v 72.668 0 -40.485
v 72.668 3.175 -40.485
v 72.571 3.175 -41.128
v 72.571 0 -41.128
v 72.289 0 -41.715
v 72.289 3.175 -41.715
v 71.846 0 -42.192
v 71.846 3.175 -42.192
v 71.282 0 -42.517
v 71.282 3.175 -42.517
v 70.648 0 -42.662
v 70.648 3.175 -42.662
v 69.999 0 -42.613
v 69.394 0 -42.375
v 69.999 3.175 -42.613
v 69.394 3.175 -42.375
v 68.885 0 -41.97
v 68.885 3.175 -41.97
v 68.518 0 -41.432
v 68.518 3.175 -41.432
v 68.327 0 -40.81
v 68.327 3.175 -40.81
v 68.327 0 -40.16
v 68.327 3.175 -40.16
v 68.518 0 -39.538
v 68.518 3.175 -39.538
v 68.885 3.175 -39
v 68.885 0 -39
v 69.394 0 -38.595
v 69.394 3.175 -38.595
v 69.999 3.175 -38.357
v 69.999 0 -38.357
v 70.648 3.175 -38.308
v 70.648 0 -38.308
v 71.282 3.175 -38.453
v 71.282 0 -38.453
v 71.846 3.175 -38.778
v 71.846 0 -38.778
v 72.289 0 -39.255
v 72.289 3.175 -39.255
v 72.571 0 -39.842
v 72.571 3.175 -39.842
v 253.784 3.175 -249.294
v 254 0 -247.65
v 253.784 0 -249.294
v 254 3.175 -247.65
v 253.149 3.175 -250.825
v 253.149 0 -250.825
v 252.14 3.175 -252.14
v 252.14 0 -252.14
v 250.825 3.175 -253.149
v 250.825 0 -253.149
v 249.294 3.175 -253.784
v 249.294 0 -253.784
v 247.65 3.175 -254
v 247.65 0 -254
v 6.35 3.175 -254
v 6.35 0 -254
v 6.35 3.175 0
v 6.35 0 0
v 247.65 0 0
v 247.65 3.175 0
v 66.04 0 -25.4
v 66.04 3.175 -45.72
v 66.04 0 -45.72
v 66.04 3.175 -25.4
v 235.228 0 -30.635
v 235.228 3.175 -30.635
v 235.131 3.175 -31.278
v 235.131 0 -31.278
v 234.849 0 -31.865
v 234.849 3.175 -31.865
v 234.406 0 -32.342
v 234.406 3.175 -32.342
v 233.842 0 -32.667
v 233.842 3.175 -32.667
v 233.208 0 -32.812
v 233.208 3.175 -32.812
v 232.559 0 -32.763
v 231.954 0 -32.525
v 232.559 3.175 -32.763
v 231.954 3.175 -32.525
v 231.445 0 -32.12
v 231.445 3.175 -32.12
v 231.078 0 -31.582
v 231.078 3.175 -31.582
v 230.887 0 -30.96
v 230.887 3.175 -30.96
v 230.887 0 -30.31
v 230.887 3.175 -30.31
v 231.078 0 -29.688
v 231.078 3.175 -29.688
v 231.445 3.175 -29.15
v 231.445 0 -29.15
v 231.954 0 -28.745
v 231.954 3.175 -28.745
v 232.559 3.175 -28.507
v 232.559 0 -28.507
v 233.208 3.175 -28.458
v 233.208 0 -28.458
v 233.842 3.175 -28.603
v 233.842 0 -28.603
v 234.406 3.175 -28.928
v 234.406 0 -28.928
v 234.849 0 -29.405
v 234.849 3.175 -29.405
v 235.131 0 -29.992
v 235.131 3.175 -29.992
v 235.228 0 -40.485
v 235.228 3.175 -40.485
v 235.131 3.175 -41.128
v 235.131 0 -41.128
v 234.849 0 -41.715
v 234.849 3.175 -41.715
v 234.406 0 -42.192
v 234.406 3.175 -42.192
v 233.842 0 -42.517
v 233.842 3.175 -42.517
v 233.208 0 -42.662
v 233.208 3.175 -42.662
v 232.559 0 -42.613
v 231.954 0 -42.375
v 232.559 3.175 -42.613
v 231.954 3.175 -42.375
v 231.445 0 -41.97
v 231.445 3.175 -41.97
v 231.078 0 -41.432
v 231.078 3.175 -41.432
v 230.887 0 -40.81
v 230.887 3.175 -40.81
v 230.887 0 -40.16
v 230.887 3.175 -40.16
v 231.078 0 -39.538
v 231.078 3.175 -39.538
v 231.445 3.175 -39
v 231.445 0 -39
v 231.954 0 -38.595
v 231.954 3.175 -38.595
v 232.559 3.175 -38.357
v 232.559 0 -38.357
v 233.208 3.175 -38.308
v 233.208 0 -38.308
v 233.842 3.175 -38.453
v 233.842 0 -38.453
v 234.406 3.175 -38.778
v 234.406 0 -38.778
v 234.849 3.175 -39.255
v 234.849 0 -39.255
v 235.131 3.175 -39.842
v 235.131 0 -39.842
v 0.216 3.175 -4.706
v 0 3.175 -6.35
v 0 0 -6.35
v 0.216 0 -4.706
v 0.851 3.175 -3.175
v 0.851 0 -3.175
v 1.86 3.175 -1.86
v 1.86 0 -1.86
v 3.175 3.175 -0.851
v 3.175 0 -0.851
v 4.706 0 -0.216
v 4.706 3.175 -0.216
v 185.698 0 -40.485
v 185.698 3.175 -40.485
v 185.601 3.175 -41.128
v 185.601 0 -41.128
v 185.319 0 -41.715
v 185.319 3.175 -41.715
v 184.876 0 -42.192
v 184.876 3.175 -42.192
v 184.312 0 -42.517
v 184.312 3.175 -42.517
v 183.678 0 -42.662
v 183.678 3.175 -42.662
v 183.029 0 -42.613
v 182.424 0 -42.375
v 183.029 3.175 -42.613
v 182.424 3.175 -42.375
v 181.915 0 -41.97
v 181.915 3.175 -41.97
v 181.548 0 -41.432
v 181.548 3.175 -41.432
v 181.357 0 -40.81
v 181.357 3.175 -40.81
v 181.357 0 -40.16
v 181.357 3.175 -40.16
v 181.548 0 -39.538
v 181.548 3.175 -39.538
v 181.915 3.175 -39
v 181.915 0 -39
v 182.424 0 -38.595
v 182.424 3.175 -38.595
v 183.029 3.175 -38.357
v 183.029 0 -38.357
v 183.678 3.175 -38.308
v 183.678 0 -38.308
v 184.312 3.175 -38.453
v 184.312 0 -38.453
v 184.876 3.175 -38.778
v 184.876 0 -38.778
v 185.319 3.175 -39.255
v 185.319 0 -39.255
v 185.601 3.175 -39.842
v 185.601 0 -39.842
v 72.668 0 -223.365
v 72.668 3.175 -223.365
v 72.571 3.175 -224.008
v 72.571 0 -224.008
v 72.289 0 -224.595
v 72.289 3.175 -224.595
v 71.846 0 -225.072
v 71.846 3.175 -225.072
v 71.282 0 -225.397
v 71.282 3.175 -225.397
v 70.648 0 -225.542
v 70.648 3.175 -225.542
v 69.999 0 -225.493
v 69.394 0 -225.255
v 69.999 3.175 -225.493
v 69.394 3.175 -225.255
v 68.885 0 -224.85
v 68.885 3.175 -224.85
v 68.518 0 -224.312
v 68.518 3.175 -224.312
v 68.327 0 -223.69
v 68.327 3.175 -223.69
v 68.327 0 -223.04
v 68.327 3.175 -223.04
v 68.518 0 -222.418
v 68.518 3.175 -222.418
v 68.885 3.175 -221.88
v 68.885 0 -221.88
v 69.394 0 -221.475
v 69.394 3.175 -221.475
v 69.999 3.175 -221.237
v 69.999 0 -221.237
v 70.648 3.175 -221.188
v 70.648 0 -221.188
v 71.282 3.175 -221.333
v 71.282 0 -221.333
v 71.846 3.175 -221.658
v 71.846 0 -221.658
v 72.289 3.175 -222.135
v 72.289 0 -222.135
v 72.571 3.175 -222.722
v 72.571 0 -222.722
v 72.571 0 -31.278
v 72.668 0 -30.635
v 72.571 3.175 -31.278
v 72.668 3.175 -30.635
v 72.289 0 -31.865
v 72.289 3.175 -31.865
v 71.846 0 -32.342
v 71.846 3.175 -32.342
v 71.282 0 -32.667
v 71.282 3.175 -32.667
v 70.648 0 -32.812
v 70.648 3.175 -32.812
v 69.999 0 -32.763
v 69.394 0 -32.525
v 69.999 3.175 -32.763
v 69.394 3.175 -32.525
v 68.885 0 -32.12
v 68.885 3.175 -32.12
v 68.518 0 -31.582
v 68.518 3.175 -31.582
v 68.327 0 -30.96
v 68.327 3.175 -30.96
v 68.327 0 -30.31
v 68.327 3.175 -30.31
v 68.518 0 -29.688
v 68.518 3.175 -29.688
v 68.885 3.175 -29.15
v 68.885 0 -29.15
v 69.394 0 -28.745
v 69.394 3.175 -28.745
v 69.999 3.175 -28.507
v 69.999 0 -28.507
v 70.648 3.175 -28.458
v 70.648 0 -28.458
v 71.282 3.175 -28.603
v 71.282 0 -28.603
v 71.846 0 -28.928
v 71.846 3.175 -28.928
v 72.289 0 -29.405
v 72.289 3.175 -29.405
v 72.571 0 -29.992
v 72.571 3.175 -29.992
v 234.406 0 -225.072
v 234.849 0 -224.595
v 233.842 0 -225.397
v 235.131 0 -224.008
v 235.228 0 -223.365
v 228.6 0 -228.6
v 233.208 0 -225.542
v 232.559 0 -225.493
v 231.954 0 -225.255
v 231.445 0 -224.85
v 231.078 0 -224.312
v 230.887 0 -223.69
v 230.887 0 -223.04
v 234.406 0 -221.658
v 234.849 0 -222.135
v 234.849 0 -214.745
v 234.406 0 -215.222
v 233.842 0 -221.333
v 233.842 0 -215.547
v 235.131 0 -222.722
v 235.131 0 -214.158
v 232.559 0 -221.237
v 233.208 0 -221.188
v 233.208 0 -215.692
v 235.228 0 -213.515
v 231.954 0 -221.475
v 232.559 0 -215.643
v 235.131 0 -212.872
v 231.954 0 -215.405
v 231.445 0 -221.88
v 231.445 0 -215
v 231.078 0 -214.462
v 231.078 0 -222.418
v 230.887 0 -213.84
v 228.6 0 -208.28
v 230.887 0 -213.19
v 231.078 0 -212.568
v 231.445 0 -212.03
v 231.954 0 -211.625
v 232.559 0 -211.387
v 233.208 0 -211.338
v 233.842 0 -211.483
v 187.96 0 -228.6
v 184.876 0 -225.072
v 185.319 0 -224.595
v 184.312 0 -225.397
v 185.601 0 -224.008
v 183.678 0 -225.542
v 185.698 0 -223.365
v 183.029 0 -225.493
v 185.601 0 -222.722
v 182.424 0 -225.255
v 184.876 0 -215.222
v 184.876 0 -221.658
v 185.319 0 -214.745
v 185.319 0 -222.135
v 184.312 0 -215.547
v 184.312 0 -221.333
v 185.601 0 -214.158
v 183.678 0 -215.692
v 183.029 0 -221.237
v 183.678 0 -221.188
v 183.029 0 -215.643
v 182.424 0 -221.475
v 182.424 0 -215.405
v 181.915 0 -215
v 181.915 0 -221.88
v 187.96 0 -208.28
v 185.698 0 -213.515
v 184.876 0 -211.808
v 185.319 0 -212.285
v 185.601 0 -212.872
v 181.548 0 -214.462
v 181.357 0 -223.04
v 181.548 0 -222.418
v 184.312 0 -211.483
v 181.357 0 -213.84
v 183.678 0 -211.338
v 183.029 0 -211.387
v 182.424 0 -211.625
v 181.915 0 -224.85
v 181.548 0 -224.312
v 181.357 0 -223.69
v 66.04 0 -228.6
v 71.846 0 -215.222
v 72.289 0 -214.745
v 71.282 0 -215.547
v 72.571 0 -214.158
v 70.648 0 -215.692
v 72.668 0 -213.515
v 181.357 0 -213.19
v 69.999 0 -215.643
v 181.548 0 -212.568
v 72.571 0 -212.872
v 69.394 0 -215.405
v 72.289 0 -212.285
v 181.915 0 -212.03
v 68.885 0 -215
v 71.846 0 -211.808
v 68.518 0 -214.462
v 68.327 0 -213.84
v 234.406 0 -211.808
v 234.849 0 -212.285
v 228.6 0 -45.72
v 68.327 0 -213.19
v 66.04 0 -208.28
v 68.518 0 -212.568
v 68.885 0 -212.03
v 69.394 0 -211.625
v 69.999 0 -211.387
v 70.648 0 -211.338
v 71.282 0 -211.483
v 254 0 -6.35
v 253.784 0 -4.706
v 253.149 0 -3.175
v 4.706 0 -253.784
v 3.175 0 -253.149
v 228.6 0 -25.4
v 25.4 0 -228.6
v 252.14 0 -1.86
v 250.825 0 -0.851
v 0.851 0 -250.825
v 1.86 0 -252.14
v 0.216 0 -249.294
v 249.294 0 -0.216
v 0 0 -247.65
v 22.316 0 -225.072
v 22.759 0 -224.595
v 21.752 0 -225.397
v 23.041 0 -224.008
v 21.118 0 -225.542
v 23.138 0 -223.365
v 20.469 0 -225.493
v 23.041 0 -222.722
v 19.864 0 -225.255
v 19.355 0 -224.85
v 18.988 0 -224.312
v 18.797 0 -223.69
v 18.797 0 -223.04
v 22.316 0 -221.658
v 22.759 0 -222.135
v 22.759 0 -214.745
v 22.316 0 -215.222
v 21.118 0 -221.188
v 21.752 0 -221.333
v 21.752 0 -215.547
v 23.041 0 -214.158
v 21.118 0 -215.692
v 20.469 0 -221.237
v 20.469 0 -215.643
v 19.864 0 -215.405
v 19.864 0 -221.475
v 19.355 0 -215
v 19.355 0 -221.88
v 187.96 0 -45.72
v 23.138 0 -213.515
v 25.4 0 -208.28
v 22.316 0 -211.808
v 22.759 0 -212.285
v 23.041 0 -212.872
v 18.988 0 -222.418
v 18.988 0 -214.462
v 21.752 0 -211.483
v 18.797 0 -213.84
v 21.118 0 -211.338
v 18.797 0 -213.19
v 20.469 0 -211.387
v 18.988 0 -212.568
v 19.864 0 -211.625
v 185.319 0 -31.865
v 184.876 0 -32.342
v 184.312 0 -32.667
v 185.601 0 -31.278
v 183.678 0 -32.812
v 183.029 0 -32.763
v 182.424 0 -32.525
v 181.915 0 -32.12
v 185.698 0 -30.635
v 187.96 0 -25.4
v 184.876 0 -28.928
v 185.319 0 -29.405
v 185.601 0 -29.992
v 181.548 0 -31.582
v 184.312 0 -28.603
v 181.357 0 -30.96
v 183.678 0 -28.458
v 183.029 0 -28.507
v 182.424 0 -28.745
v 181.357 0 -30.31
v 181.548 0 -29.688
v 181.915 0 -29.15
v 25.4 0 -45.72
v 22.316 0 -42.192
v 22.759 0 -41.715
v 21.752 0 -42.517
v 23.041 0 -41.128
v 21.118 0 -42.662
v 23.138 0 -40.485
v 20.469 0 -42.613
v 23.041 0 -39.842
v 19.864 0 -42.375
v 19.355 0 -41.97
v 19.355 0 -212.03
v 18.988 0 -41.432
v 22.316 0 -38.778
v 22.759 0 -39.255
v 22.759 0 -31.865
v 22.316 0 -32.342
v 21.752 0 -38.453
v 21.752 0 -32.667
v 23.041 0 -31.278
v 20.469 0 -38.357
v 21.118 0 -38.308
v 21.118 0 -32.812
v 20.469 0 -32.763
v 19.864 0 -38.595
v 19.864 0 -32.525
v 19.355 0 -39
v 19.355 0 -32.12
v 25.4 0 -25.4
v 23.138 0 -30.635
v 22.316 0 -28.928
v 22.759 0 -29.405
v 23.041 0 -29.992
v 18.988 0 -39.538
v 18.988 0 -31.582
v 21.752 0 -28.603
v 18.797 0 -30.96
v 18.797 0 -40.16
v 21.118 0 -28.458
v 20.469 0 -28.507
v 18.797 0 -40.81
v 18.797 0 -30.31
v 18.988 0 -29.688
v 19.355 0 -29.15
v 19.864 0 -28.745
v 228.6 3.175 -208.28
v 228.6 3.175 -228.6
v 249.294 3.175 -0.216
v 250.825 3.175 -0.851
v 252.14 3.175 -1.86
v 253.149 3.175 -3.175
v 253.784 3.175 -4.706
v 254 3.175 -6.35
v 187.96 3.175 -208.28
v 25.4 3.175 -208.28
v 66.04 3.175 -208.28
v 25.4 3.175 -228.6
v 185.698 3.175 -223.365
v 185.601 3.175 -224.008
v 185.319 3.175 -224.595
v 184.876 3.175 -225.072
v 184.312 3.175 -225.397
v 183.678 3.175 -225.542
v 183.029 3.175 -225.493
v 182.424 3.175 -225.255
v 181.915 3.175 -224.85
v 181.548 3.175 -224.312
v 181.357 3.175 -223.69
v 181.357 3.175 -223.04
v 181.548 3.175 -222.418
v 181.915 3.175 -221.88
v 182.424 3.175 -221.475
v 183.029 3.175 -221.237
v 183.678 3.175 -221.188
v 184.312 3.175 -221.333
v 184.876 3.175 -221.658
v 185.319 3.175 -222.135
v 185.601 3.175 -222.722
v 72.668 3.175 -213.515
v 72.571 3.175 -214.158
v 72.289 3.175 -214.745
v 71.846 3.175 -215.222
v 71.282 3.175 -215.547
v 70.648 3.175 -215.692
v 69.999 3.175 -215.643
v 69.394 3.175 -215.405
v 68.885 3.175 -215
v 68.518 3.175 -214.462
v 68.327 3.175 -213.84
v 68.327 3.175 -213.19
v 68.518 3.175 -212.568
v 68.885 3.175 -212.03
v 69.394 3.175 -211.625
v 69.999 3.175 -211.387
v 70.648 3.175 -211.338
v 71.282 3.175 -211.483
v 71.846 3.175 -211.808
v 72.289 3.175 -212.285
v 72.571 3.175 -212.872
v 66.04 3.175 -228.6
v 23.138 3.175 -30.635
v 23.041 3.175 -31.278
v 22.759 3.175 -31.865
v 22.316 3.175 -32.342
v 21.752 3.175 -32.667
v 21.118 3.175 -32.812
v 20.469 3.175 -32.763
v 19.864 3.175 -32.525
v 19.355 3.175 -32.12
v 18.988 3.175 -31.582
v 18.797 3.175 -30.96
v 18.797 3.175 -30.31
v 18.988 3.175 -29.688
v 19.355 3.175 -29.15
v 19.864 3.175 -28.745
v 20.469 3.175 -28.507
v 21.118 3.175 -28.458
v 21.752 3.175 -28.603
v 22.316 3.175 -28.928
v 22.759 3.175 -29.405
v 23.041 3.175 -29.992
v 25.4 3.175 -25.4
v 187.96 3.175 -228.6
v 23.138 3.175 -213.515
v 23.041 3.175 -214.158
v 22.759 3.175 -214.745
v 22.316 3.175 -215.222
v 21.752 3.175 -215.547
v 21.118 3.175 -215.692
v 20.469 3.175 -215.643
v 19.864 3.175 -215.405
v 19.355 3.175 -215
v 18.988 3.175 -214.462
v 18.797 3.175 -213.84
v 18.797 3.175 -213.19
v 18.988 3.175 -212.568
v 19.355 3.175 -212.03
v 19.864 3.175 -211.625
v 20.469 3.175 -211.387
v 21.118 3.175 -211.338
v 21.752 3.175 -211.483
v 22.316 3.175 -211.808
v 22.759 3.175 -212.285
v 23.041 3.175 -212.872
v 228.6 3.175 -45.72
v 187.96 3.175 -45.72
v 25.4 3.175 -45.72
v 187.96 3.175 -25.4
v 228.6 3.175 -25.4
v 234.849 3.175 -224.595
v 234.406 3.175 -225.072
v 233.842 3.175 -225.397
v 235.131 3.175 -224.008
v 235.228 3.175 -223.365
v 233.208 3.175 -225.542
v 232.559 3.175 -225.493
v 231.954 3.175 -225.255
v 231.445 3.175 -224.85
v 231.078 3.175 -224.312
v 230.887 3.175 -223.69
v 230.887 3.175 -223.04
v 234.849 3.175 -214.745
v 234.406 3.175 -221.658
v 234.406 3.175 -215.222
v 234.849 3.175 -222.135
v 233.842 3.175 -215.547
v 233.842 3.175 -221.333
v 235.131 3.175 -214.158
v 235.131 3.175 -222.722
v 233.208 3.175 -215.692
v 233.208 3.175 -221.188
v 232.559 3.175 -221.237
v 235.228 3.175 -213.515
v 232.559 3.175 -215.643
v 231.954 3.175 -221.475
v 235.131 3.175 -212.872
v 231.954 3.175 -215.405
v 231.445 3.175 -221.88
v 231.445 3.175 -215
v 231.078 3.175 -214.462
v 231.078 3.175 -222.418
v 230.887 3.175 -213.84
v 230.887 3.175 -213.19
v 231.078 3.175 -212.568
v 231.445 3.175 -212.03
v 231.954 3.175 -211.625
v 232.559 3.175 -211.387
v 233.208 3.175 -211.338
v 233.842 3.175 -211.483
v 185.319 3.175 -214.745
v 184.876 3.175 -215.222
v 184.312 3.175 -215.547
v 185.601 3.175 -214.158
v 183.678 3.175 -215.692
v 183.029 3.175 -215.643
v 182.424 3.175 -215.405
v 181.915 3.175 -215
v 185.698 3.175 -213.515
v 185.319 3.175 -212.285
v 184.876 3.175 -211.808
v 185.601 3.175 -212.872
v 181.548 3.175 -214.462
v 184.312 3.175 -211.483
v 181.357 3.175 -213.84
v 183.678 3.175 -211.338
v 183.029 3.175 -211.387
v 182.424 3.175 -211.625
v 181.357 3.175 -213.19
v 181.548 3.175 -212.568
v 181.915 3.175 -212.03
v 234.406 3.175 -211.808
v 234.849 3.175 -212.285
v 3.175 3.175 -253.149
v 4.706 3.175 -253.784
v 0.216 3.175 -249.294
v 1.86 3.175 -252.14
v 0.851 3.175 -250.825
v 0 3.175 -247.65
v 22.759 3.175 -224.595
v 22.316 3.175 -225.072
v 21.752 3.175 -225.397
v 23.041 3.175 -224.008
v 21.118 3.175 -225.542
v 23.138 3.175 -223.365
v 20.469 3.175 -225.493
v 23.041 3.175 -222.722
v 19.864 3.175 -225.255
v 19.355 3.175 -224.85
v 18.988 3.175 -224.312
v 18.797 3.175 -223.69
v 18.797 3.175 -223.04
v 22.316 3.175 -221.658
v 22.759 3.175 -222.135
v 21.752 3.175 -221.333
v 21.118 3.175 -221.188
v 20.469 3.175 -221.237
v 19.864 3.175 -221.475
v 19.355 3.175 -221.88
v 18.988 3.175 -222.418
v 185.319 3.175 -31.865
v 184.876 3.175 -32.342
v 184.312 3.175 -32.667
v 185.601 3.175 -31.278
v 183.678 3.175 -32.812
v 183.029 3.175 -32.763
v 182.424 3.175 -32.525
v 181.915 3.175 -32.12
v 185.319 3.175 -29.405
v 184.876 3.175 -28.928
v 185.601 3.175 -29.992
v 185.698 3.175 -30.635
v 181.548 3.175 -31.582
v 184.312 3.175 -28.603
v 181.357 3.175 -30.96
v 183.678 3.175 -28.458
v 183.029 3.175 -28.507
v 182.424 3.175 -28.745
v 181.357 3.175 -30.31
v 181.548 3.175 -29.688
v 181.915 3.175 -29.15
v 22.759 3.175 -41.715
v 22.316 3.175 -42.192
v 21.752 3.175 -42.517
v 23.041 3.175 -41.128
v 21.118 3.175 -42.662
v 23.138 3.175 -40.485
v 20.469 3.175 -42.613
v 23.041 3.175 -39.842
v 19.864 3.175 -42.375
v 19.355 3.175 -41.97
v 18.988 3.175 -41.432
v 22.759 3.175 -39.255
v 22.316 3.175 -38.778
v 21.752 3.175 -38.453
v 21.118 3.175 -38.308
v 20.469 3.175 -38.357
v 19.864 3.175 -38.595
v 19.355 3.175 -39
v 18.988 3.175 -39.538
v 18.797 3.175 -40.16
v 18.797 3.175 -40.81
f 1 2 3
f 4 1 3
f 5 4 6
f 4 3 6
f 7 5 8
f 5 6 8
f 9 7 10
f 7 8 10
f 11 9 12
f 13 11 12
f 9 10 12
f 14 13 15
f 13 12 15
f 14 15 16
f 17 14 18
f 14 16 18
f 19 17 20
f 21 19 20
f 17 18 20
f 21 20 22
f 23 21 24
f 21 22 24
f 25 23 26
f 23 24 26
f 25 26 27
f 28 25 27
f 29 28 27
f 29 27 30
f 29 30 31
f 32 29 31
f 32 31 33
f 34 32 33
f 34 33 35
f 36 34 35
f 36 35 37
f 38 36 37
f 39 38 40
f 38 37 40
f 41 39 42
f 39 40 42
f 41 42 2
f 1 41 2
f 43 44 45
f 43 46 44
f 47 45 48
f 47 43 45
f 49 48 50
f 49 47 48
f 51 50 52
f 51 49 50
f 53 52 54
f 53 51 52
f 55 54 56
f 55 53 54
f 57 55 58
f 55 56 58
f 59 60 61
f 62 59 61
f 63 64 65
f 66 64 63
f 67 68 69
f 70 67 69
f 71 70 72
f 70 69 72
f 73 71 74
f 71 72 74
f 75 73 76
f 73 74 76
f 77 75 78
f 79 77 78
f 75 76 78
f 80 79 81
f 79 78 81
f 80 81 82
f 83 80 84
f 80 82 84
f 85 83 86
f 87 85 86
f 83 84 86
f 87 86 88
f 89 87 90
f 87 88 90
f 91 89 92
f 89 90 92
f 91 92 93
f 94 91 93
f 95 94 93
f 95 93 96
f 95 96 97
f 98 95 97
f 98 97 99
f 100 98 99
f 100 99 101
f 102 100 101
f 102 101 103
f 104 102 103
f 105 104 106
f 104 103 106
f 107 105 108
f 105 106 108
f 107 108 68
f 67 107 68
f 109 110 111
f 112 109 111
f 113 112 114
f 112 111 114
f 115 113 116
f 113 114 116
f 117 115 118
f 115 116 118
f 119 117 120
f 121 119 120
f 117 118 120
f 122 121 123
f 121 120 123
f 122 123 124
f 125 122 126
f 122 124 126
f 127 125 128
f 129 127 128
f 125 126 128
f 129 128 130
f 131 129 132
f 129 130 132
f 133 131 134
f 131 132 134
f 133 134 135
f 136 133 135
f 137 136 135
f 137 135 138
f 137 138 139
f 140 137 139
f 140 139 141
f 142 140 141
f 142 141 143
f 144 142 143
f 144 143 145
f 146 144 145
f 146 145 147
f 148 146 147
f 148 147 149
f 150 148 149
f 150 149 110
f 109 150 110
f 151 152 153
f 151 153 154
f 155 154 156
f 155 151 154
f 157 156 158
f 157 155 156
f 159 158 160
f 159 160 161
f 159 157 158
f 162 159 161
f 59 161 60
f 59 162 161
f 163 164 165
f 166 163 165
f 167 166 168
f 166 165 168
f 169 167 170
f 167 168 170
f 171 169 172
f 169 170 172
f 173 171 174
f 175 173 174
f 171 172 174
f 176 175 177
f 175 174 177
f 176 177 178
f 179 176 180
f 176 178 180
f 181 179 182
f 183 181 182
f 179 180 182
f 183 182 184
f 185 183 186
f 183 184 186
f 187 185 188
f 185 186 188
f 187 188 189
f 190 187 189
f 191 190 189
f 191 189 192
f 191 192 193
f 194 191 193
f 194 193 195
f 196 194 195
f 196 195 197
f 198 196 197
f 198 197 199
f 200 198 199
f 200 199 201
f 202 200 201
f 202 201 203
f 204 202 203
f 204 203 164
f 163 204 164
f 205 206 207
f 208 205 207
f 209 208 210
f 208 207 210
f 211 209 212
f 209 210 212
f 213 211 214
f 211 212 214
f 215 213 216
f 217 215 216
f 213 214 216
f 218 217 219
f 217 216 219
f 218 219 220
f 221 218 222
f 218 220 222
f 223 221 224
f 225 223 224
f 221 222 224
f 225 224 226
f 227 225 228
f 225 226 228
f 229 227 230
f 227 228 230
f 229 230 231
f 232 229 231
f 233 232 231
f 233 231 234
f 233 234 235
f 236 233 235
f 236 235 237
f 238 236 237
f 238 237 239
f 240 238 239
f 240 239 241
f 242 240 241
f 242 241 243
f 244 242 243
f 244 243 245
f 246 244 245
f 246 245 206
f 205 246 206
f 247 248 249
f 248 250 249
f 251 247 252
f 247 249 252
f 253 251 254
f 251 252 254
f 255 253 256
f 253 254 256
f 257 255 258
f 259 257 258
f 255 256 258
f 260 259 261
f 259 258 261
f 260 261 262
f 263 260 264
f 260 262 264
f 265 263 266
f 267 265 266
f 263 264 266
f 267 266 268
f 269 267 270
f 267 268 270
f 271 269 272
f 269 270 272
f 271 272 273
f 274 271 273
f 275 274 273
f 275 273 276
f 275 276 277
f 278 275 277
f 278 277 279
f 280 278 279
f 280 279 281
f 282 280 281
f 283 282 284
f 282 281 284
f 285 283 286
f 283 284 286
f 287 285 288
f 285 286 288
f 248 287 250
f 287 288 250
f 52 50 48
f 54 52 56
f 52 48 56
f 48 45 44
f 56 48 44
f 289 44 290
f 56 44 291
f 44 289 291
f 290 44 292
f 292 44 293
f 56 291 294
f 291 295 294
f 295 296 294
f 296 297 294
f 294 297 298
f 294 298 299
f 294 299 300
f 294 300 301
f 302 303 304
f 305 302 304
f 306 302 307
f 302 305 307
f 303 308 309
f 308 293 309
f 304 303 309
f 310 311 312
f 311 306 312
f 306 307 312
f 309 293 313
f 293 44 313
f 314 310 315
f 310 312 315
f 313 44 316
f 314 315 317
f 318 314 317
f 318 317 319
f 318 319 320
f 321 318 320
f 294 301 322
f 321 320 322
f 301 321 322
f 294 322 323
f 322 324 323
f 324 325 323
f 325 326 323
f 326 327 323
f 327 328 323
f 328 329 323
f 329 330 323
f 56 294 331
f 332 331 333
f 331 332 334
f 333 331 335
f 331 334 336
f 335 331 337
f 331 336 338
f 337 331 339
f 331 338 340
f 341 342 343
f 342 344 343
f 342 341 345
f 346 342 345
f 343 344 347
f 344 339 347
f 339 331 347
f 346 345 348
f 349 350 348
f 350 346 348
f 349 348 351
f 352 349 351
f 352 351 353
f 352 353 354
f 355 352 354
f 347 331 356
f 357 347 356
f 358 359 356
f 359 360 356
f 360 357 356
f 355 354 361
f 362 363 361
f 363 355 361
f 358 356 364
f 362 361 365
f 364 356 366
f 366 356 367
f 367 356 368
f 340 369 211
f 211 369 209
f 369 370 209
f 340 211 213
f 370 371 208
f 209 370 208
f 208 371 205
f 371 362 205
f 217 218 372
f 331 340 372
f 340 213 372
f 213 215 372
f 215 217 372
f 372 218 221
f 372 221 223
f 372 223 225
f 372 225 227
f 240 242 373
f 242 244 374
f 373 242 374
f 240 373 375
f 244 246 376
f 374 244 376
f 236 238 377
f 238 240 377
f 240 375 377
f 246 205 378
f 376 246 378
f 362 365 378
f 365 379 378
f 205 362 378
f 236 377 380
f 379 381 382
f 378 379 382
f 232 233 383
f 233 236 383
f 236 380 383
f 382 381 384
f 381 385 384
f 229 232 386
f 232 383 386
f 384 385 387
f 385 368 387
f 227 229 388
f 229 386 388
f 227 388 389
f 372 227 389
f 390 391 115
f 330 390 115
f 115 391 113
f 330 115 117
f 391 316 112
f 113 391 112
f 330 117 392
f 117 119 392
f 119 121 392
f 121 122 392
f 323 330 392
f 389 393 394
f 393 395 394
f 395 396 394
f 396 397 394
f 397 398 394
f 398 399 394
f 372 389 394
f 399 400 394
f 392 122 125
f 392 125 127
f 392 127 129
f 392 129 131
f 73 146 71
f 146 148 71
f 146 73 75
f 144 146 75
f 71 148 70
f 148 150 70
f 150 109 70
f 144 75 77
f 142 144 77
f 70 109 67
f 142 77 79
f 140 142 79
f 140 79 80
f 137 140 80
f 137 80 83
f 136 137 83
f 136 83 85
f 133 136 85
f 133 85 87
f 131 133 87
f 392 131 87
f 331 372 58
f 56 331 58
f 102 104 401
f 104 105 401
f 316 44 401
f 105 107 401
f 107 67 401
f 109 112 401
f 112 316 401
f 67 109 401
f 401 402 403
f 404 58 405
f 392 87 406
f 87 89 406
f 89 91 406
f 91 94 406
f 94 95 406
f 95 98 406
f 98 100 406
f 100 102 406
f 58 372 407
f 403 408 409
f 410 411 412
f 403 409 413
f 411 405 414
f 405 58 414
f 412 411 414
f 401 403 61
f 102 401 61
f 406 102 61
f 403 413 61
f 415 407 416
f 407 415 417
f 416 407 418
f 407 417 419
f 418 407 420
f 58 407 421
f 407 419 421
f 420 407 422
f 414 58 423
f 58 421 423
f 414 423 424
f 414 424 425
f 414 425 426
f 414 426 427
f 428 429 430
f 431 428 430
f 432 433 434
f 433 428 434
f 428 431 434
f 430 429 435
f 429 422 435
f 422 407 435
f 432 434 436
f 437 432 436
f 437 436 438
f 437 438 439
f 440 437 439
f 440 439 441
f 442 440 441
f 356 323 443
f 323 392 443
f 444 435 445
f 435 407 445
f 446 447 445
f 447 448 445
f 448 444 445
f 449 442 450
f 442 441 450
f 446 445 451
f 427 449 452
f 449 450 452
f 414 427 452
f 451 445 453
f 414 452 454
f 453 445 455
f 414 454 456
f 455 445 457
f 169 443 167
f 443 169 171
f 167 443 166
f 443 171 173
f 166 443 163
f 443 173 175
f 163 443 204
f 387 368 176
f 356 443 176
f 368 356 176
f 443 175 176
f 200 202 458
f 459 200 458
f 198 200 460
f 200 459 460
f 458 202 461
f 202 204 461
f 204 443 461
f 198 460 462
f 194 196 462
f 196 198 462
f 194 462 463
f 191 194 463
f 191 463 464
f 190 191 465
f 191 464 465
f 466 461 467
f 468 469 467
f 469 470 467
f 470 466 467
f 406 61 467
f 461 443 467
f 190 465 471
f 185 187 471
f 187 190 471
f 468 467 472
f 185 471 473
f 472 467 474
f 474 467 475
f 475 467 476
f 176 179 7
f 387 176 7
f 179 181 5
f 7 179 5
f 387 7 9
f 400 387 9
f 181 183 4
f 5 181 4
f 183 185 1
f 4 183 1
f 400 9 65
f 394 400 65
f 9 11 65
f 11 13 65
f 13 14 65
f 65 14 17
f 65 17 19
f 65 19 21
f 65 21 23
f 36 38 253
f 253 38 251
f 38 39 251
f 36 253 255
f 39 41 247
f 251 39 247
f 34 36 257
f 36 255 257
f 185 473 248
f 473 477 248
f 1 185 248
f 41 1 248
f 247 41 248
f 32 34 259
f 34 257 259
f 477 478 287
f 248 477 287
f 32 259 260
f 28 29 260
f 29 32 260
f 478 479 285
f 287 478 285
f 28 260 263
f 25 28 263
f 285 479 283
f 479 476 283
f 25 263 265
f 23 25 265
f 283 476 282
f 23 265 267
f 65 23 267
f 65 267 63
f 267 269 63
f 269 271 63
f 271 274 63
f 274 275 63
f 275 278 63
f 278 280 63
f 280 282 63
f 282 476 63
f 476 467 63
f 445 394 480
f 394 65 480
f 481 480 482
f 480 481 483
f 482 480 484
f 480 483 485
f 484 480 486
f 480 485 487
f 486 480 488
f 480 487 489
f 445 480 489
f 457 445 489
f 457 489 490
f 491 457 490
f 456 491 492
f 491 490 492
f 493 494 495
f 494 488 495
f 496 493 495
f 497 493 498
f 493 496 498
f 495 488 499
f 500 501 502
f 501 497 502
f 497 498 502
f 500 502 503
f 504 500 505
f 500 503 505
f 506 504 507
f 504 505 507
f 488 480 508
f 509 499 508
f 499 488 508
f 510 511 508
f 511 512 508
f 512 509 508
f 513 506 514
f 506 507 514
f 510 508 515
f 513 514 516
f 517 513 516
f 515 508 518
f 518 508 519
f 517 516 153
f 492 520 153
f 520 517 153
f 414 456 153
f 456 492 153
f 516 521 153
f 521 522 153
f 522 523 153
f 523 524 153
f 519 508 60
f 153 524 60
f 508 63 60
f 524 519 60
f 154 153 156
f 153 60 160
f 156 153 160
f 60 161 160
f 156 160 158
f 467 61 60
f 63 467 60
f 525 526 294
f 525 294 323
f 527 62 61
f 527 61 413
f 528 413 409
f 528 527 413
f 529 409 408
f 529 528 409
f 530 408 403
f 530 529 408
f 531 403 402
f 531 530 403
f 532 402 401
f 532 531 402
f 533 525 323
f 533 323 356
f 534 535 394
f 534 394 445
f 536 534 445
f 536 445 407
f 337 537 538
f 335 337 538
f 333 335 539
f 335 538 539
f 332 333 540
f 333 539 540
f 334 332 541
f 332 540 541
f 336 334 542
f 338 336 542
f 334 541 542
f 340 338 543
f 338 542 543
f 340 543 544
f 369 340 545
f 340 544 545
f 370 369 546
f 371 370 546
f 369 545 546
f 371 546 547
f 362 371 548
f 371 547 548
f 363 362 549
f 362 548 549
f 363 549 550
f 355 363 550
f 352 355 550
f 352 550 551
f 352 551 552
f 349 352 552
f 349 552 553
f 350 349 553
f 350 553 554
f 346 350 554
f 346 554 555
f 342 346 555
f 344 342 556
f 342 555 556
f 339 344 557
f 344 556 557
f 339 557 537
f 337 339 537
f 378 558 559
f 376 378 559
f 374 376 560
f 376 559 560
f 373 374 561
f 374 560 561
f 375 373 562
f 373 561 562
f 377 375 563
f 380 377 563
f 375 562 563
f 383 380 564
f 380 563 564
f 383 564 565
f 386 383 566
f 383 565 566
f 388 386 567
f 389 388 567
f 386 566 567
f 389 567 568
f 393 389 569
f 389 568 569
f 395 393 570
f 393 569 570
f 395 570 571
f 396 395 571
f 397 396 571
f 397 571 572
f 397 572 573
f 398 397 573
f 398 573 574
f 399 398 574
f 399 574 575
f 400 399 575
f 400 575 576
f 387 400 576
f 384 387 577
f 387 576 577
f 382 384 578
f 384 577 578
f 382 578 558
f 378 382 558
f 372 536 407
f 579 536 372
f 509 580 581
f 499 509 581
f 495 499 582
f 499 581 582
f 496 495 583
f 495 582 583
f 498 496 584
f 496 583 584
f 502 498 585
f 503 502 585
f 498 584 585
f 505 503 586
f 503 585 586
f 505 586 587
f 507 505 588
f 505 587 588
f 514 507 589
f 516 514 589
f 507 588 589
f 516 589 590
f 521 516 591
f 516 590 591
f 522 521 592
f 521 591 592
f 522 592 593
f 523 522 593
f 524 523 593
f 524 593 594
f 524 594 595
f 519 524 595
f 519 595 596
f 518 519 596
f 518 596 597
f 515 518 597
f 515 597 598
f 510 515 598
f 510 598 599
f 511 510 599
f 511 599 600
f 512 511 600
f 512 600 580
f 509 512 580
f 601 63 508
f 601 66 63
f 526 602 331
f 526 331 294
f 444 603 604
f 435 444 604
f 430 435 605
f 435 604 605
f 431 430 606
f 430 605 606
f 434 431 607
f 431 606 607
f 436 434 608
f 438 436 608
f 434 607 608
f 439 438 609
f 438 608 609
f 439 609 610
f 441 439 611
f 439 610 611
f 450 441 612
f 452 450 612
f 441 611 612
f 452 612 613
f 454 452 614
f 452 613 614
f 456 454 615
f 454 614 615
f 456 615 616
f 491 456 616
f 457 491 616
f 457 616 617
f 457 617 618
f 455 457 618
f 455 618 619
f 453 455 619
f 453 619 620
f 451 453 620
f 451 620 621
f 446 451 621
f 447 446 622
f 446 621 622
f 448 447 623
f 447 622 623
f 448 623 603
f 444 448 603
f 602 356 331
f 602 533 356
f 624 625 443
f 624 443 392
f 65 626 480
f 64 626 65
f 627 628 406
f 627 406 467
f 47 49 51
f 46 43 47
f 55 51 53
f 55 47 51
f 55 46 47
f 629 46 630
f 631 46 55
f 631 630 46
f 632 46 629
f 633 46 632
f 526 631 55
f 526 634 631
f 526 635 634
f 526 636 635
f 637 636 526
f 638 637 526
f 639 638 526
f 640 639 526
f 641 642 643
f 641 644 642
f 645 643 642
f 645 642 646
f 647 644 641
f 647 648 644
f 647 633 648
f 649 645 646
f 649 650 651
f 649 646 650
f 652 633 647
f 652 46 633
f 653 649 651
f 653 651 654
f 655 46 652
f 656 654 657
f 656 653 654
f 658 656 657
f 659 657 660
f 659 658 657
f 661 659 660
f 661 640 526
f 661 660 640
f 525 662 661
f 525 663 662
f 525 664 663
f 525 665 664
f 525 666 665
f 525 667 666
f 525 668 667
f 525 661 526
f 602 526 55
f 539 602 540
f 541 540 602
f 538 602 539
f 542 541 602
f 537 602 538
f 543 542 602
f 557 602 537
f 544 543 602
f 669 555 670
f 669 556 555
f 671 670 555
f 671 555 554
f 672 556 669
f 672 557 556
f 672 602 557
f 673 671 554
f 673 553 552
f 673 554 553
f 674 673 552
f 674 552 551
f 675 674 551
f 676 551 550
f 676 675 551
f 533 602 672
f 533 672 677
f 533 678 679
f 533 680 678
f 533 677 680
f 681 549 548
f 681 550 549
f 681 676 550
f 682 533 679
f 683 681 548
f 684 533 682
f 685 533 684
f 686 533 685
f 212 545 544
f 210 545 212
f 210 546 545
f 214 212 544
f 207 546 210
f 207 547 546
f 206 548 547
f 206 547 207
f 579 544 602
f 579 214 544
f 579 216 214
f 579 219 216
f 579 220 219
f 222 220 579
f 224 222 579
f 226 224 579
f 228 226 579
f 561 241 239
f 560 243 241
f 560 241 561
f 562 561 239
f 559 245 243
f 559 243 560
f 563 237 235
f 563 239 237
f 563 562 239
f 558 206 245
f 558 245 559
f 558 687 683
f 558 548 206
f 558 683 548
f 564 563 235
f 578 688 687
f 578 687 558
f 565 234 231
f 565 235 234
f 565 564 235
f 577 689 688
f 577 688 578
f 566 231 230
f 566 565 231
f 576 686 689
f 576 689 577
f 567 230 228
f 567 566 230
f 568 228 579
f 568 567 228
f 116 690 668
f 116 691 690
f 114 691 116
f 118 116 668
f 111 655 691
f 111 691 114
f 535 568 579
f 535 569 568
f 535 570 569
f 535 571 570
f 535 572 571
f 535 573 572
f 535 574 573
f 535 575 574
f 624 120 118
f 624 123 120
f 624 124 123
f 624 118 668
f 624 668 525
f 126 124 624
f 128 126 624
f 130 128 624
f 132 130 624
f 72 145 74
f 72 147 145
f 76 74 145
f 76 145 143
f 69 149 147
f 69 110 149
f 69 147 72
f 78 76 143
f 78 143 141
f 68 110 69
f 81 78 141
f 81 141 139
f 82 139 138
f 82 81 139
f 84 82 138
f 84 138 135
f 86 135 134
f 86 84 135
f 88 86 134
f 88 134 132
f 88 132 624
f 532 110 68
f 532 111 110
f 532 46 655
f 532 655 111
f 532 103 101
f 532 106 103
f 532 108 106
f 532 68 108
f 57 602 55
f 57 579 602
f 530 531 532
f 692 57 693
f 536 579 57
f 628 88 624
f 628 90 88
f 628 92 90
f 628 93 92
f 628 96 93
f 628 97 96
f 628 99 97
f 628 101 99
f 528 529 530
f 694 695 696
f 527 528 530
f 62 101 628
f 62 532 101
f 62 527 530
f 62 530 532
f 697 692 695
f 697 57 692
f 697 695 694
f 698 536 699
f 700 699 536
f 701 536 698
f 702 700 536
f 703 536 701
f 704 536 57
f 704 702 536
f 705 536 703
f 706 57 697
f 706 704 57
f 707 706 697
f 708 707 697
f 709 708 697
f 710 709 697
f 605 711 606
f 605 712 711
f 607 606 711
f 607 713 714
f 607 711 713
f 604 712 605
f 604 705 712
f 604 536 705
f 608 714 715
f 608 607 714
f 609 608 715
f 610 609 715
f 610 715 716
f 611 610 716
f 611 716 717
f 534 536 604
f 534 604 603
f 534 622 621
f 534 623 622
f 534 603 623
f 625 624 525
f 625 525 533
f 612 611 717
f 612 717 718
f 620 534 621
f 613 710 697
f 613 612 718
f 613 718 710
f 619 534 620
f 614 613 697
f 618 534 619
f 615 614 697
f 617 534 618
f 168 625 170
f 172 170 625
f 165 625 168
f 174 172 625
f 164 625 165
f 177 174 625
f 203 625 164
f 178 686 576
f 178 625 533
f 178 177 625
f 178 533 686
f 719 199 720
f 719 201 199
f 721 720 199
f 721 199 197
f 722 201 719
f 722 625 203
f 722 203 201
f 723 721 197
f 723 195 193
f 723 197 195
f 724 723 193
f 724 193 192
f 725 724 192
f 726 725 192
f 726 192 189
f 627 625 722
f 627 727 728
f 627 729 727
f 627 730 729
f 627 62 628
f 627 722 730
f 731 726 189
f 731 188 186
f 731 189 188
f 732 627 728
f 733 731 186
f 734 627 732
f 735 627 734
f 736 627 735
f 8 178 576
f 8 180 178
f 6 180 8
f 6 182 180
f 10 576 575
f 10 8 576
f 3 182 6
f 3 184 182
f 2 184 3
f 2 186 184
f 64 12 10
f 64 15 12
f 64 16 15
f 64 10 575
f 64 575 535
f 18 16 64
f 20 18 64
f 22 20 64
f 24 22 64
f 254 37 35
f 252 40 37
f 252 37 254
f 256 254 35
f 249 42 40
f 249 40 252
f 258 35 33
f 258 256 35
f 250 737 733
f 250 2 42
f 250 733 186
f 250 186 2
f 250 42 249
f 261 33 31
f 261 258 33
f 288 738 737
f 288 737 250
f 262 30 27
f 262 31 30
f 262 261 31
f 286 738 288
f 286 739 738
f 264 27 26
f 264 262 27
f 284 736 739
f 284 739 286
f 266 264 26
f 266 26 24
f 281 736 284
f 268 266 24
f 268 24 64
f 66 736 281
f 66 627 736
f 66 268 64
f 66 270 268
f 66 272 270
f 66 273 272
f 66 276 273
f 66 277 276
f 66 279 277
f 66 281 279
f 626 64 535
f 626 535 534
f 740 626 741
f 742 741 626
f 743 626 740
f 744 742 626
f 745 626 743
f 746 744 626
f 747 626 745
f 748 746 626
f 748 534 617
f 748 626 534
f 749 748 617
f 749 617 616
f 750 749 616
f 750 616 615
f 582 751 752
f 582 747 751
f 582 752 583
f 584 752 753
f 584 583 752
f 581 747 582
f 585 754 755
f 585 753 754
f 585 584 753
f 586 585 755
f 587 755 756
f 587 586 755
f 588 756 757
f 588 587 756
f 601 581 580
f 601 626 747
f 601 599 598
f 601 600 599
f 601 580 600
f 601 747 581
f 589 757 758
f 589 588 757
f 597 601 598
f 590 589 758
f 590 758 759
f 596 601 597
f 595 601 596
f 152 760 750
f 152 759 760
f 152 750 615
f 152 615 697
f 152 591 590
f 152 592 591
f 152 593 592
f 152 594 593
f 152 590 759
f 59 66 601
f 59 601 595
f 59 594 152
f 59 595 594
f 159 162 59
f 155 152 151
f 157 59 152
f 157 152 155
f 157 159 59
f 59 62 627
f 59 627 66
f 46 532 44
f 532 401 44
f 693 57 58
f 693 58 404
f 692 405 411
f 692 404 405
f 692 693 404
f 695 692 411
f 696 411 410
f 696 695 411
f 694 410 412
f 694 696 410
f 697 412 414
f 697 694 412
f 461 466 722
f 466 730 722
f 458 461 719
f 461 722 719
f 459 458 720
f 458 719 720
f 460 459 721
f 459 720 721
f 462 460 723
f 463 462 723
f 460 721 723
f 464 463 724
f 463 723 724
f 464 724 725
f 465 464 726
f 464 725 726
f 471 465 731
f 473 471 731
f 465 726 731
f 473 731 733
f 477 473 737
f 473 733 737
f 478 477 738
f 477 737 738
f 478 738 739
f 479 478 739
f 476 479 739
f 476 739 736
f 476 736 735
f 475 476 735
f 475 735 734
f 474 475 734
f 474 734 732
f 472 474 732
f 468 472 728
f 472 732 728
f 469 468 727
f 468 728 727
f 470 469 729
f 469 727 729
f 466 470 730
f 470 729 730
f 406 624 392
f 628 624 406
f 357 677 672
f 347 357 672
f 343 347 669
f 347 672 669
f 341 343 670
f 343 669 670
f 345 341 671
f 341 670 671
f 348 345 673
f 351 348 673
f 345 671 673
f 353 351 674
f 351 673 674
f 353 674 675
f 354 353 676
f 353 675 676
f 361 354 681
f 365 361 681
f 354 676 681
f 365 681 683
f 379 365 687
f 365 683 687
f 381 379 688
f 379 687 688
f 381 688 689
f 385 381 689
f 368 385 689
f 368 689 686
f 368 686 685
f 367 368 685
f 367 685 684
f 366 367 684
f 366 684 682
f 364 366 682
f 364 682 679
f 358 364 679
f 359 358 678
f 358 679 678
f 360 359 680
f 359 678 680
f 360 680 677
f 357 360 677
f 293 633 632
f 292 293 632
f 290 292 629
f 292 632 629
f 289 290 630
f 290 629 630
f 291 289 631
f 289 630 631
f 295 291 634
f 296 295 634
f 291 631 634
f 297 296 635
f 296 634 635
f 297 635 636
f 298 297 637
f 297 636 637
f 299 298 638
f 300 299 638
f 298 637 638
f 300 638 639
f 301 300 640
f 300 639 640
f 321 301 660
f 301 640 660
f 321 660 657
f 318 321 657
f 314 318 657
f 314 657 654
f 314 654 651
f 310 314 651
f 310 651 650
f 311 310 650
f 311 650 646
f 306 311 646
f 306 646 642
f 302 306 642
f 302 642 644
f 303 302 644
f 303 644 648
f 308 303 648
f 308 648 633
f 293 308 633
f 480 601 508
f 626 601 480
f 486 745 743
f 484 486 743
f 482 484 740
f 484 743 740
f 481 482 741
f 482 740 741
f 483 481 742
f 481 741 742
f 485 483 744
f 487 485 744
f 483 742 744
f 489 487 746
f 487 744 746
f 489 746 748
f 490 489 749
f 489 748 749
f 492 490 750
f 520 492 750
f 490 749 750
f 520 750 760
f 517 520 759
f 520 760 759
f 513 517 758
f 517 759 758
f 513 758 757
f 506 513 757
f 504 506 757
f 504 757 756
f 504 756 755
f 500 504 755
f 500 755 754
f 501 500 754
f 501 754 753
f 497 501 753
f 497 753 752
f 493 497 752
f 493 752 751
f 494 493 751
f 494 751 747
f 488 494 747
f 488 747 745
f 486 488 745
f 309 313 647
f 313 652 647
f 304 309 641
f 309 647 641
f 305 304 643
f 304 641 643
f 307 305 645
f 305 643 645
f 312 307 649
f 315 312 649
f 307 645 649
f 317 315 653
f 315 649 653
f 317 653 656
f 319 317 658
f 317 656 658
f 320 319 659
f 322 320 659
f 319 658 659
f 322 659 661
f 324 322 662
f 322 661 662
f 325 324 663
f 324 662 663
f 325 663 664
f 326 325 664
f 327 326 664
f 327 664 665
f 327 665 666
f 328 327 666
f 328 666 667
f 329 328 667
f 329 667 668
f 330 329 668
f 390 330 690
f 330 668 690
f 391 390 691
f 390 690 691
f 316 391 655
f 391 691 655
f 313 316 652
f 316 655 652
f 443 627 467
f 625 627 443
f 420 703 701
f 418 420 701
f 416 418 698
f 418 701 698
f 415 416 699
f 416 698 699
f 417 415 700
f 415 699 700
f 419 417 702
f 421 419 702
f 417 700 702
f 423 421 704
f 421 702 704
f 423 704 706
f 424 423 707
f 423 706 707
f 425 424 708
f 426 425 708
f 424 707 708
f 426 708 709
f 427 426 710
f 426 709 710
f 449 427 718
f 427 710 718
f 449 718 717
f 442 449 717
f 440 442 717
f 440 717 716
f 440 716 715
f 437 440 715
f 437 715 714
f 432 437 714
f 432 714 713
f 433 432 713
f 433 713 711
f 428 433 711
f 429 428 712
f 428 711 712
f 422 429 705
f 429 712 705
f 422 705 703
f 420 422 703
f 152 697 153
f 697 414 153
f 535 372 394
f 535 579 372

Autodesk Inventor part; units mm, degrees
ref_plane "YZ Plane" through (0, 0, 0) normal (1, 0, 0) x (0, 1, 0)
ref_plane "XZ Plane" through (0, 0, 0) normal (0, 1, 0) x (-1, 0, 0)
ref_plane "XY Plane" through (0, 0, 0) normal (0, 0, 1) x (1, 0, 0)
sketch "Sketch1" plane through (0, 0, 0) normal (0, 1, 0) x (-1, 0, 0)
  line L0 (0, 0) -> (-254, 0)
  line L1 (-254, 0) -> (-254, -254)
  line L2 (-254, -254) -> (0, -254)
  line L3 (0, -254) -> (0, 0)
  dimension "d0" = 254
  dimension "d1" = 254
extrude "Extrusion1" add sketch "Sketch1" along normal blind 3.175
fillet "Fillet1" radius 6.35 4 edges at (0, 1.5875, 0) (254, 1.5875, 0) (254, 1.5875, -254) (0, 1.5875, -254)
sketch "Sketch2" plane through (0, 3.175, 0) normal (0, 1, 0) x (1, 0, 0)
  line L0 (247.65, 254) -> (6.35, 254) projected
  line L1 (0, 247.65) -> (0, 6.35) projected
  line L2 (25.4, 45.72) -> (66.04, 45.72)
  line L3 (66.04, 45.72) -> (66.04, 25.4)
  line L4 (66.04, 25.4) -> (25.4, 25.4)
  line L5 (25.4, 25.4) -> (25.4, 45.72)
  line L6 (254, 6.35) -> (254, 247.65) projected
  line L7 (6.35, 0) -> (247.65, 0) projected
  circle A0 centre (20.955, 30.635) radius 2.1828
  circle A1 centre (20.955, 40.485) radius 2.1828
  circle A2 centre (70.485, 40.485) radius 2.1828
  circle A3 centre (70.485, 30.635) radius 2.1828
  line L8 (25.4, 228.6) -> (66.04, 228.6)
  line L9 (66.04, 228.6) -> (66.04, 208.28)
  line L10 (66.04, 208.28) -> (25.4, 208.28)
  line L11 (25.4, 208.28) -> (25.4, 228.6)
  circle A4 centre (20.955, 213.515) radius 2.1828
  circle A5 centre (20.955, 223.365) radius 2.1828
  circle A6 centre (70.485, 223.365) radius 2.1828
  circle A7 centre (70.485, 213.515) radius 2.1828
  circle A8 centre (233.045, 223.365) radius 2.1828
  circle A9 centre (233.045, 213.515) radius 2.1828
  line L12 (228.6, 228.6) -> (228.6, 208.28)
  line L13 (187.96, 228.6) -> (228.6, 228.6)
  line L14 (228.6, 208.28) -> (187.96, 208.28)
  line L15 (187.96, 208.28) -> (187.96, 228.6)
  circle A10 centre (183.515, 223.365) radius 2.1828
  circle A11 centre (183.515, 213.515) radius 2.1828
  circle A12 centre (233.045, 40.485) radius 2.1828
  circle A13 centre (233.045, 30.635) radius 2.1828
  line L16 (228.6, 45.72) -> (228.6, 25.4)
  line L17 (187.96, 45.72) -> (228.6, 45.72)
  line L18 (228.6, 25.4) -> (187.96, 25.4)
  line L19 (187.96, 25.4) -> (187.96, 45.72)
  circle A14 centre (183.515, 40.485) radius 2.1828
  circle A15 centre (183.515, 30.635) radius 2.1828
  point P0 (0, 0)
  point P1 (45.72, 25.4)
  point P2 (25.4, 35.56)
  point P3 (45.72, 208.28)
  point P4 (25.4, 218.44)
  point P5 (127, 254)
  point P6 (208.28, 208.28)
  point P7 (187.96, 218.44)
  point P8 (208.28, 25.4)
  point P9 (187.96, 35.56)
  point P10 (208.28, 228.6)
  dimension "d13" = 40.64
  dimension "d14" = 20.32
  dimension "d19" = 25.4
  dimension "d20" = 25.4
  dimension "d23" = 4.3656
  dimension "d24" = 4.3656
  dimension "d25" = 4.3656
  dimension "d26" = 4.3656
  dimension "d27" = 9.85
  dimension "d28" = 9.85
  dimension "d29" = 49.53
  dimension "d30" = 49.53
  dimension "d31" = 0
  dimension "d32" = 0
  dimension "d33" = 4.445
  dimension "d34" = 5.235
  dimension "d35" = 40.64
  dimension "d36" = 20.32
  dimension "d37" = 4.3656
  dimension "d38" = 4.3656
  dimension "d39" = 4.3656
  dimension "d40" = 4.3656
  dimension "d41" = 9.85
  dimension "d42" = 9.85
  dimension "d43" = 49.53
  dimension "d44" = 49.53
  dimension "d45" = 0
  dimension "d46" = 0
  dimension "d47" = 4.445
  dimension "d48" = 5.235
  dimension "d51" = 25.4
  dimension "d52" = 25.4
  dimension "d53" = 40.64
  dimension "d54" = 20.32
  dimension "d55" = 4.3656
  dimension "d56" = 4.3656
  dimension "d57" = 4.3656
  dimension "d58" = 4.3656
  dimension "d59" = 9.85
  dimension "d60" = 9.85
  dimension "d61" = 49.53
  dimension "d62" = 49.53
  dimension "d63" = 0
  dimension "d64" = 0
  dimension "d65" = 4.445
  dimension "d66" = 5.235
  dimension "d69" = 40.64
  dimension "d70" = 20.32
  dimension "d71" = 4.3656
  dimension "d72" = 4.3656
  dimension "d73" = 4.3656
  dimension "d74" = 4.3656
  dimension "d75" = 9.85
  dimension "d76" = 9.85
  dimension "d77" = 49.53
  dimension "d78" = 49.53
  dimension "d79" = 0
  dimension "d80" = 0
  dimension "d81" = 4.445
  dimension "d82" = 5.235
  dimension "d85" = 25.4
  dimension "d86" = 25.4
  dimension "d87" = 25.4
  dimension "d88" = 25.4
extrude "Extrusion2" cut sketch "Sketch2" against normal blind 3.175
equation "\"d13\" = d5"
equation "\"d14\" = d6"
equation "\"d20\" = d8"
equation "\"d28\" = d27"
equation "\"d29\" = d30"
equation "\"d33\" = -0.5 * d13 + 0.5 * d29"
equation "\"d34\" = -0.5 * d27 + 0.5 * d14"
equation "\"d35\" = d49"
equation "\"d36\" = d50"
equation "\"d42\" = d41"
equation "\"d43\" = d44"
equation "\"d47\" = -0.5 * d35 + 0.5 * d43"
equation "\"d48\" = -0.5 * d41 + 0.5 * d36"
equation "\"d53\" = d67"
equation "\"d54\" = d68"
equation "\"d60\" = d59"
equation "\"d61\" = d62"
equation "\"d65\" = -0.5 * d53 + 0.5 * d61"
equation "\"d66\" = -0.5 * d59 + 0.5 * d54"
equation "\"d69\" = d83"
equation "\"d70\" = d84"
equation "\"d76\" = d75"
equation "\"d77\" = d78"
equation "\"d81\" = -0.5 * d69 + 0.5 * d77"
equation "\"d82\" = -0.5 * d75 + 0.5 * d70"
equation "\"d5\" = 40.64"
equation "\"d6\" = 20.32"
equation "\"d49\" = 40.64"
equation "\"d50\" = 20.32"
equation "\"d67\" = 40.64"
equation "\"d68\" = 20.32"
equation "\"d83\" = 40.64"
equation "\"d84\" = 20.32"
equation "\"d8\" = 25.4"
properties part number "RobotBase" material "Bronze, Cast"
